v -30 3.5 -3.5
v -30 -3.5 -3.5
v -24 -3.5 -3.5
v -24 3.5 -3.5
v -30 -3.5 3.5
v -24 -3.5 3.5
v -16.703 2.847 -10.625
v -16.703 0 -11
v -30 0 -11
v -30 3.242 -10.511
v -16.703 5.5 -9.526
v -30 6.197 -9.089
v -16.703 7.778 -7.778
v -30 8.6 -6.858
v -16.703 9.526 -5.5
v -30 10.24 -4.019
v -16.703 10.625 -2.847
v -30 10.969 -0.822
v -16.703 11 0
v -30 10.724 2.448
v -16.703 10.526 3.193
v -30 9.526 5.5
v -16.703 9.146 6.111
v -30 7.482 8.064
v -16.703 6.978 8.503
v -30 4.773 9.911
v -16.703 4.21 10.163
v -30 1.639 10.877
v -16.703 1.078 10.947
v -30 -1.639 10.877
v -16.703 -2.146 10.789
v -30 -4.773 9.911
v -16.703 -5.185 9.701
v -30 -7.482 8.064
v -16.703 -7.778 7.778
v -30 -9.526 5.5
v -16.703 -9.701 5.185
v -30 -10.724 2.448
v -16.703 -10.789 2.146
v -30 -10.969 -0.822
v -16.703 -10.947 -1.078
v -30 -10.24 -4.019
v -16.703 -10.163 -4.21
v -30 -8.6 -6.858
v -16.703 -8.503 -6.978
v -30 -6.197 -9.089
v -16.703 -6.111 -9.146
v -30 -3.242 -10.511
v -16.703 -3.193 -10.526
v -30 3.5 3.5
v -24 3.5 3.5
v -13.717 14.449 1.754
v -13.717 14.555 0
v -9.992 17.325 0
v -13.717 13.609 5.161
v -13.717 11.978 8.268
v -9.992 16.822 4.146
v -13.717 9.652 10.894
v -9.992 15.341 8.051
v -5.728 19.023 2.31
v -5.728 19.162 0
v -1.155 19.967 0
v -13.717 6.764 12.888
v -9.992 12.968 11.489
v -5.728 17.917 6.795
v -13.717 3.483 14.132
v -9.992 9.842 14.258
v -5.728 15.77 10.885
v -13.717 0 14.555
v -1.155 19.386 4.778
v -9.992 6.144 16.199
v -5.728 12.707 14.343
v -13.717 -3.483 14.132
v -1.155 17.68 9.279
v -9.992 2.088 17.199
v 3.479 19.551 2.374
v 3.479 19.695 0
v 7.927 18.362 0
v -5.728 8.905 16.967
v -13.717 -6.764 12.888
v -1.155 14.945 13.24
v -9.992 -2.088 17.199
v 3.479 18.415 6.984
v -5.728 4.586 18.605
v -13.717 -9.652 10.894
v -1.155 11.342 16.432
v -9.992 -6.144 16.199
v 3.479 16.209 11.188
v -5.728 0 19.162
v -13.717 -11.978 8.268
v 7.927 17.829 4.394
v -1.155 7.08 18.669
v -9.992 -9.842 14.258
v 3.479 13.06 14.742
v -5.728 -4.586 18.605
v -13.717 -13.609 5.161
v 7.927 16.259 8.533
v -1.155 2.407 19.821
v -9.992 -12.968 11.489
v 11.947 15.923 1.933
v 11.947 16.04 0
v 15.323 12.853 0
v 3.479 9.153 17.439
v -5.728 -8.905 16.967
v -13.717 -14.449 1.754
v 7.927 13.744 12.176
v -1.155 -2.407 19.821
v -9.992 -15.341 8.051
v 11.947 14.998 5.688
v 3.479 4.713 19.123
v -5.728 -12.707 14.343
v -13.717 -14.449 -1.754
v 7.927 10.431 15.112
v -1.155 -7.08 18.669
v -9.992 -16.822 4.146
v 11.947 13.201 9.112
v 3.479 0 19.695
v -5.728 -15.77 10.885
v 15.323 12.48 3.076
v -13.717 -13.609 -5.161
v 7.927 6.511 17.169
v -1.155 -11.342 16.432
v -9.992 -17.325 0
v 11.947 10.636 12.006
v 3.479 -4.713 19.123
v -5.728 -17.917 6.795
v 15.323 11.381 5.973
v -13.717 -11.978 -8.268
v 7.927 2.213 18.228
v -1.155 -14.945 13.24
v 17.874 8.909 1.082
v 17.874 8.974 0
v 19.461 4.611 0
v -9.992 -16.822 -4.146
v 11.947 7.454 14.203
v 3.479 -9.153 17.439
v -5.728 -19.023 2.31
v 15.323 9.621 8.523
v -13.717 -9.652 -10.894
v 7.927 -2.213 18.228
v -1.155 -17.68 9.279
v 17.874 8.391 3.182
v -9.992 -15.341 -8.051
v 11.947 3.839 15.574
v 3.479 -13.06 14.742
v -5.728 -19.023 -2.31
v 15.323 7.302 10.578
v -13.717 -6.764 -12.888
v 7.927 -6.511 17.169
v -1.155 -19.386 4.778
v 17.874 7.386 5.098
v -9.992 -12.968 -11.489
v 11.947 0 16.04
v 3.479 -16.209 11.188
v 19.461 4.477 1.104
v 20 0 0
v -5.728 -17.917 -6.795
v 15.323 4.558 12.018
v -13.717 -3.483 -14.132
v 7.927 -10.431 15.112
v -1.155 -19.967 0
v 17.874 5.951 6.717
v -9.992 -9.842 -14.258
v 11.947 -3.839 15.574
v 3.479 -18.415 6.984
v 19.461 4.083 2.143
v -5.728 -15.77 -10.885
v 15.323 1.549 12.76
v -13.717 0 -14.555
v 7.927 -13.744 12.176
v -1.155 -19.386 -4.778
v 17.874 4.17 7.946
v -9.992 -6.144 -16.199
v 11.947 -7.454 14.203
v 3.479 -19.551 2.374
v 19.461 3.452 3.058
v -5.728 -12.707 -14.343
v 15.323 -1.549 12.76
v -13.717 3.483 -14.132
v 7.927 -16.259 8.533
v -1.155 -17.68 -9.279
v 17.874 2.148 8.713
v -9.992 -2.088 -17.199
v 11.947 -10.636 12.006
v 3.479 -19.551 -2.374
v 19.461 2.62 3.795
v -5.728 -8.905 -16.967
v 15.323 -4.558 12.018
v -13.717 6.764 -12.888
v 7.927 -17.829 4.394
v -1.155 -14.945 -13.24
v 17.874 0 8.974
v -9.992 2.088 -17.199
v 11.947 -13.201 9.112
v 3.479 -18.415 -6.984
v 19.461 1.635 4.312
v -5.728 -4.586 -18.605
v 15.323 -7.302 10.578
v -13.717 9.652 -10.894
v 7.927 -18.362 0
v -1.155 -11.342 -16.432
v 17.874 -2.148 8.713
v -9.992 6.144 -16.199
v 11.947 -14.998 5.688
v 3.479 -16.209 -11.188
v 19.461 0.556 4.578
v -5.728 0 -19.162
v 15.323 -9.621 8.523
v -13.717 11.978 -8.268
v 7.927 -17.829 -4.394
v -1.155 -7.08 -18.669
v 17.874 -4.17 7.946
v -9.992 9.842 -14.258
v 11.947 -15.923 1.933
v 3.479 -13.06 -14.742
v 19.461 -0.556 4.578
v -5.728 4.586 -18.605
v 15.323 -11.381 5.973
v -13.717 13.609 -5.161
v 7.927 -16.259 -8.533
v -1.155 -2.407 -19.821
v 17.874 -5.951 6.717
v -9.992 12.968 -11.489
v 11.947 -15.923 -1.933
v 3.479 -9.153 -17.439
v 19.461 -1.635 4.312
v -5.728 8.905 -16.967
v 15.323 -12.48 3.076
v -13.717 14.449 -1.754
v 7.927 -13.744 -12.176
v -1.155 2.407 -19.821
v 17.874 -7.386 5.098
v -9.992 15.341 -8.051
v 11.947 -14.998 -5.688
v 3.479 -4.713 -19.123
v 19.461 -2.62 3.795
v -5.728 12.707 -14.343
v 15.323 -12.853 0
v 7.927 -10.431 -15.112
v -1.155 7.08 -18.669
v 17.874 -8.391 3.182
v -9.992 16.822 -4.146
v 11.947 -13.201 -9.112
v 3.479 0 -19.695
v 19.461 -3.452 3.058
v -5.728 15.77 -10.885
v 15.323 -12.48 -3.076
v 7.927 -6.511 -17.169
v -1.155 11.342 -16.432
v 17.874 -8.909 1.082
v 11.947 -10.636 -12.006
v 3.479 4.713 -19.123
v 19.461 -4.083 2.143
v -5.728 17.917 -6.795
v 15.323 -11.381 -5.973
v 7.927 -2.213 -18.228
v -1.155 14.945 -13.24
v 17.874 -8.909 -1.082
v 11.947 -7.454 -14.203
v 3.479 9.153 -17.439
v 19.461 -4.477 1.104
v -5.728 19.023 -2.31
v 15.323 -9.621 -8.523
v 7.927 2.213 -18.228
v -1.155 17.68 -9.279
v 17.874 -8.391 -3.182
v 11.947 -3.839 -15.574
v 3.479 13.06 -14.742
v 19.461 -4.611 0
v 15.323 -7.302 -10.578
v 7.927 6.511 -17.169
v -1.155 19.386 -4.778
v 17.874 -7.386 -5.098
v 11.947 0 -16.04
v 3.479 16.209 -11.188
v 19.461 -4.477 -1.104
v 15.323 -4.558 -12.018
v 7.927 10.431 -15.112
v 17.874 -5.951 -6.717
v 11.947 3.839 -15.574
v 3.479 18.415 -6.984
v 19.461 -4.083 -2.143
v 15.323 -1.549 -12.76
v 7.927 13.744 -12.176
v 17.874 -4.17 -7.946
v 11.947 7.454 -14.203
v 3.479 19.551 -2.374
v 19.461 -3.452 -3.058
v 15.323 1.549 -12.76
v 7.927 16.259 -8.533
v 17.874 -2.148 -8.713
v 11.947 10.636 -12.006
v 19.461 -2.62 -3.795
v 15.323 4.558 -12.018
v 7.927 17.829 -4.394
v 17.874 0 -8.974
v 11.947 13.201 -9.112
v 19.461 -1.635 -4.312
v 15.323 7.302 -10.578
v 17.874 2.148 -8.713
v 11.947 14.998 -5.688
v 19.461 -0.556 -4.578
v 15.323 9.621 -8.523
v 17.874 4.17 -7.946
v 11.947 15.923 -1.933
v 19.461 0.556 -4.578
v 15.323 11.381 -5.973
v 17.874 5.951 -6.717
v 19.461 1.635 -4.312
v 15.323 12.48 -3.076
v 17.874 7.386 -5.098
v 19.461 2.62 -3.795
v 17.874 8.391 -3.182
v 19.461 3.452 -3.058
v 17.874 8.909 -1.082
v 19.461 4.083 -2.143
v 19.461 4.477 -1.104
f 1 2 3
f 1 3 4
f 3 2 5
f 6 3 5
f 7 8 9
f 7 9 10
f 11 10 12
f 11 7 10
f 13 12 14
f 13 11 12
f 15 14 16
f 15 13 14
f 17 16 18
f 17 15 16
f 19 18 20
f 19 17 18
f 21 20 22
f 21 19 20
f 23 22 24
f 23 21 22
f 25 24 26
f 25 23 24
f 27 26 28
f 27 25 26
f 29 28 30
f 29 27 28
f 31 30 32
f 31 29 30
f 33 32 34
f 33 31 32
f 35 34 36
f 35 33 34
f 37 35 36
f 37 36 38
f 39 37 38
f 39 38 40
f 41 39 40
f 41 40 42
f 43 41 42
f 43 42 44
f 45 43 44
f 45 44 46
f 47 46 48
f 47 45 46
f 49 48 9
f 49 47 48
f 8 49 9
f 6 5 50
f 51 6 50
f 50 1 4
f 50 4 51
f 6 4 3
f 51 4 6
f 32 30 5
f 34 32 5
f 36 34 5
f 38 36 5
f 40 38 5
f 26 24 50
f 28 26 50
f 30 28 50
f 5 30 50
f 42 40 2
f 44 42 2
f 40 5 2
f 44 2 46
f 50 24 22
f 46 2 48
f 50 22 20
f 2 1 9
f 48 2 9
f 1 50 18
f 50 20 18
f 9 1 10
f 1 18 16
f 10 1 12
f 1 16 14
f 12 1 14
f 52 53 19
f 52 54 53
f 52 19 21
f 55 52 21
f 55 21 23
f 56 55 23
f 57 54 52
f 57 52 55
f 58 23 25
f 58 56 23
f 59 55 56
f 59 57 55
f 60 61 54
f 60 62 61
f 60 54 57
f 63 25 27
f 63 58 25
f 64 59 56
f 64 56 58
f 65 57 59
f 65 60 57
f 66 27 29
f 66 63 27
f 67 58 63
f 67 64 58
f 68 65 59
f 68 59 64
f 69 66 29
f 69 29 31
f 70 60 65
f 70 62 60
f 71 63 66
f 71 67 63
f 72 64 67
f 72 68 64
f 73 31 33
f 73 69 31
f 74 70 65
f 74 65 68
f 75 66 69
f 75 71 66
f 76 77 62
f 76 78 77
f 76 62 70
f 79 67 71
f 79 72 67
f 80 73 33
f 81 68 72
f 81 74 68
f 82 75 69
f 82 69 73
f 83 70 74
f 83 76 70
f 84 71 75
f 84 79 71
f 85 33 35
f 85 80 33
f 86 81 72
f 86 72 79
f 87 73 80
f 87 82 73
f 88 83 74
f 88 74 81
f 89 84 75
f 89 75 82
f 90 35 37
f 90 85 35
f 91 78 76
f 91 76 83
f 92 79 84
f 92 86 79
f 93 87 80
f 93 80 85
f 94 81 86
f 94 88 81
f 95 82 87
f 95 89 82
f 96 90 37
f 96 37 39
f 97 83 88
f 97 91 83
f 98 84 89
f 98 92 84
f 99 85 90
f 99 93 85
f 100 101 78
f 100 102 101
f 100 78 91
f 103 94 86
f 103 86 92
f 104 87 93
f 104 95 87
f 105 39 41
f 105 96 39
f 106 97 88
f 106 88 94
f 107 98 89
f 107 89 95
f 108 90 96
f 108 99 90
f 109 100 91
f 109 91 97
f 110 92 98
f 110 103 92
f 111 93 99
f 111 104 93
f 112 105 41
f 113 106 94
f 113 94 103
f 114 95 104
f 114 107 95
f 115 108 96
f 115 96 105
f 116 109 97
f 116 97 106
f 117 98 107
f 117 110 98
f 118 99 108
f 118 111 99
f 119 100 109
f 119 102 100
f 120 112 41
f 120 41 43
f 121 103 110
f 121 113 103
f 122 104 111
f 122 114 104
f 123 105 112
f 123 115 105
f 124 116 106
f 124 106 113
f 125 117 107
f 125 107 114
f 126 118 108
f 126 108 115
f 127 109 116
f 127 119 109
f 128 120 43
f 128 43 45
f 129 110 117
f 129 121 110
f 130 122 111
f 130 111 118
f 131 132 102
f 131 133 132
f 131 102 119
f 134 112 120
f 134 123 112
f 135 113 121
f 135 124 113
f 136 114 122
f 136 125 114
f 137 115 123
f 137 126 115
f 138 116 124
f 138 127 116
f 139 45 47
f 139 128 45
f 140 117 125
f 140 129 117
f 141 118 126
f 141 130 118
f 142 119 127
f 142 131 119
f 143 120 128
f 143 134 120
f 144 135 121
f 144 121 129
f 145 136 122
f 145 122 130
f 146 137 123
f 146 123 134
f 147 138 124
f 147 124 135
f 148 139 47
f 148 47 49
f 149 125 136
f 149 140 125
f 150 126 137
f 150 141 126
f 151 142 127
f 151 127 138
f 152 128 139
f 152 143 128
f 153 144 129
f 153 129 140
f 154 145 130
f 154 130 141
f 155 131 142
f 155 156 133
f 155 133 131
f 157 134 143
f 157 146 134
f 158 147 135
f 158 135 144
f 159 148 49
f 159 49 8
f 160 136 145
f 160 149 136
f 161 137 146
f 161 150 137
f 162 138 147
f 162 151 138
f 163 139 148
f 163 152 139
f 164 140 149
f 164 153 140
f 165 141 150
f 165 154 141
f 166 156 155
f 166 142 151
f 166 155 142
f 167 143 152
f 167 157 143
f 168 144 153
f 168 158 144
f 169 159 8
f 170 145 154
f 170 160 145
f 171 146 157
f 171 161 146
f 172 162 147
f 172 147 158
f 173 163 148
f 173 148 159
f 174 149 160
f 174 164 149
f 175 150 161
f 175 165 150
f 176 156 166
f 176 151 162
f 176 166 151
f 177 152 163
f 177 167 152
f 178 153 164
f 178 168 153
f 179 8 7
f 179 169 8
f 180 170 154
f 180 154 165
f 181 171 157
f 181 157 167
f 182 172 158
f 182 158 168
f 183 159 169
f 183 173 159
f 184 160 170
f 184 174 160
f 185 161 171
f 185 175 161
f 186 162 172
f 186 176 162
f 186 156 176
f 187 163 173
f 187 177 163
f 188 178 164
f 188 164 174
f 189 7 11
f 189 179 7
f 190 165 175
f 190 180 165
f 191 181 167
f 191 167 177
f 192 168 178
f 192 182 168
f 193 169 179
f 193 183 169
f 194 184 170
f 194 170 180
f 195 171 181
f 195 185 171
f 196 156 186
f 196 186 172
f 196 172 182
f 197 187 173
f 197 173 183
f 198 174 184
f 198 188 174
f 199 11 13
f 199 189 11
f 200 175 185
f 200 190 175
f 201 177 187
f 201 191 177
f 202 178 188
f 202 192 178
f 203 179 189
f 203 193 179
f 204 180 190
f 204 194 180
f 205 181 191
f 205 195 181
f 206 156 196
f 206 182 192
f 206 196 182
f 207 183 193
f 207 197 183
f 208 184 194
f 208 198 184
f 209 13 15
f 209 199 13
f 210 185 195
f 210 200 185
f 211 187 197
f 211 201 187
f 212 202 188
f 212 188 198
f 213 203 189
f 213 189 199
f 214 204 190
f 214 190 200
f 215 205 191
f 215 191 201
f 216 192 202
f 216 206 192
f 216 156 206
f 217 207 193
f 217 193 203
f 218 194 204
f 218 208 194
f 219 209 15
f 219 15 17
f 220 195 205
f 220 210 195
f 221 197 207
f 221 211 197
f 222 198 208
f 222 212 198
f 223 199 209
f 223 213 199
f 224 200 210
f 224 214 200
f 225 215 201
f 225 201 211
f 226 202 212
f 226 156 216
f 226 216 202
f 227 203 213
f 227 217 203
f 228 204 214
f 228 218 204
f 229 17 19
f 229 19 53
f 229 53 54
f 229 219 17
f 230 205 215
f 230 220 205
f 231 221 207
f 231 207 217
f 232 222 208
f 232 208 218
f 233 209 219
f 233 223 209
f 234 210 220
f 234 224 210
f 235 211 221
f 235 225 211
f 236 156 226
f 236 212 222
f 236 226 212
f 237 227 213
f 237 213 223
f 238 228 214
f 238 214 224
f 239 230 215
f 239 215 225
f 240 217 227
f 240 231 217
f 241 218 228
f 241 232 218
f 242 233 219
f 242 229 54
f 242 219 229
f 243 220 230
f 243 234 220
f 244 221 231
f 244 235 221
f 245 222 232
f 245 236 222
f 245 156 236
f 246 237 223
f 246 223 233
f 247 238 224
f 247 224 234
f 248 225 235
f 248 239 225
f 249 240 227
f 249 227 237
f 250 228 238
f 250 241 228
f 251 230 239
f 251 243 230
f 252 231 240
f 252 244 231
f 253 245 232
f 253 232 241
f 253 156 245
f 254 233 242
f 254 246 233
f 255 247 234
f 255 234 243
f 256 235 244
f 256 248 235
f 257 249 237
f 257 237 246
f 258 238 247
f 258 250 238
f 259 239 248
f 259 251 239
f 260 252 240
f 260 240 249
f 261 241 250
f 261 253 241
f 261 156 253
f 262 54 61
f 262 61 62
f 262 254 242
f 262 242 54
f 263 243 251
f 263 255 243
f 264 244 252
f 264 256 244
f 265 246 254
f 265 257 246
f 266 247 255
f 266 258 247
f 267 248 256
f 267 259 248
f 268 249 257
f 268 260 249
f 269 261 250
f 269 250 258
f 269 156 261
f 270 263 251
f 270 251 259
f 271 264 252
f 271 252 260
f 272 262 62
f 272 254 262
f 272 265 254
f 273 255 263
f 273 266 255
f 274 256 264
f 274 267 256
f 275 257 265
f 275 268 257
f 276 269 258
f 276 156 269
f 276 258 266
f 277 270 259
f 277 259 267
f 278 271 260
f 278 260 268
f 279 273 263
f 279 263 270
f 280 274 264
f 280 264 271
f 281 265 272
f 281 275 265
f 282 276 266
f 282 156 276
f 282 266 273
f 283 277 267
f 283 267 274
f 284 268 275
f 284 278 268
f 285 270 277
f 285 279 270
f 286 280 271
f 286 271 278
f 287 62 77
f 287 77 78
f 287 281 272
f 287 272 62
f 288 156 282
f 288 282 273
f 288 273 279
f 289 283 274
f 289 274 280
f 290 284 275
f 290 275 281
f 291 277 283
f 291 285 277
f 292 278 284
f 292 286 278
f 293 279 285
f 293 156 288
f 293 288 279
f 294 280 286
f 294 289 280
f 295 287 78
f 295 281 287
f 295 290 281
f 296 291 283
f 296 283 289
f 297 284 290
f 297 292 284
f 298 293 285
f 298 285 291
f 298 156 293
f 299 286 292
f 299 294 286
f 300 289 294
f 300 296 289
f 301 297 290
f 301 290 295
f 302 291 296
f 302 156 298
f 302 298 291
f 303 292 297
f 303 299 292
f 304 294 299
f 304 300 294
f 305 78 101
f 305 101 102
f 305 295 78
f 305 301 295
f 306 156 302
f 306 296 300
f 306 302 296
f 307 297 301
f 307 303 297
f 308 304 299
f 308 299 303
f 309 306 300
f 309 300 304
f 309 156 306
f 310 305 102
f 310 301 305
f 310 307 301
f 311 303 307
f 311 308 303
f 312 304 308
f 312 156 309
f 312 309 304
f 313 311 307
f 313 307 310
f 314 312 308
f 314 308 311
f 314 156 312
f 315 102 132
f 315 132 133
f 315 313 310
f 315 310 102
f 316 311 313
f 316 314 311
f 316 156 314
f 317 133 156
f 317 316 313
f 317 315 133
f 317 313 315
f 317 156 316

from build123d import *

# Parameters (mm, degrees)
SKETCH3_R           = 11
BOSS_EXTRUDE1_DEPTH = 30
SKETCH4_W           = 7
SKETCH4_H           = 7
CUT_EXTRUDE1_DEPTH  = 6


with BuildPart() as part:
    # Sketch1 → Revolve1 (revolve)
    with BuildSketch(Plane.XY):
        with BuildLine():
            Line((20, 0), (-20, 0))
            ThreePointArc((-20, 0), (0, 20), (20, 0))
        make_face()
    revolve(axis=Axis((-20, 0, 0), (1, 0, 0)))

    # Sketch3 → Boss-Extrude1 (add)
    with BuildSketch(Plane(origin=(0, 0, 0), x_dir=(0, 0, -1), z_dir=(1, 0, 0))):
        Circle(SKETCH3_R)
    extrude(amount=-BOSS_EXTRUDE1_DEPTH)

    # Sketch4 → Cut-Extrude1 (cut)
    with BuildSketch(Plane.ZY.offset(30)):
        Rectangle(SKETCH4_W, SKETCH4_H)
    extrude(amount=-CUT_EXTRUDE1_DEPTH, mode=Mode.SUBTRACT)


solid = part.part
